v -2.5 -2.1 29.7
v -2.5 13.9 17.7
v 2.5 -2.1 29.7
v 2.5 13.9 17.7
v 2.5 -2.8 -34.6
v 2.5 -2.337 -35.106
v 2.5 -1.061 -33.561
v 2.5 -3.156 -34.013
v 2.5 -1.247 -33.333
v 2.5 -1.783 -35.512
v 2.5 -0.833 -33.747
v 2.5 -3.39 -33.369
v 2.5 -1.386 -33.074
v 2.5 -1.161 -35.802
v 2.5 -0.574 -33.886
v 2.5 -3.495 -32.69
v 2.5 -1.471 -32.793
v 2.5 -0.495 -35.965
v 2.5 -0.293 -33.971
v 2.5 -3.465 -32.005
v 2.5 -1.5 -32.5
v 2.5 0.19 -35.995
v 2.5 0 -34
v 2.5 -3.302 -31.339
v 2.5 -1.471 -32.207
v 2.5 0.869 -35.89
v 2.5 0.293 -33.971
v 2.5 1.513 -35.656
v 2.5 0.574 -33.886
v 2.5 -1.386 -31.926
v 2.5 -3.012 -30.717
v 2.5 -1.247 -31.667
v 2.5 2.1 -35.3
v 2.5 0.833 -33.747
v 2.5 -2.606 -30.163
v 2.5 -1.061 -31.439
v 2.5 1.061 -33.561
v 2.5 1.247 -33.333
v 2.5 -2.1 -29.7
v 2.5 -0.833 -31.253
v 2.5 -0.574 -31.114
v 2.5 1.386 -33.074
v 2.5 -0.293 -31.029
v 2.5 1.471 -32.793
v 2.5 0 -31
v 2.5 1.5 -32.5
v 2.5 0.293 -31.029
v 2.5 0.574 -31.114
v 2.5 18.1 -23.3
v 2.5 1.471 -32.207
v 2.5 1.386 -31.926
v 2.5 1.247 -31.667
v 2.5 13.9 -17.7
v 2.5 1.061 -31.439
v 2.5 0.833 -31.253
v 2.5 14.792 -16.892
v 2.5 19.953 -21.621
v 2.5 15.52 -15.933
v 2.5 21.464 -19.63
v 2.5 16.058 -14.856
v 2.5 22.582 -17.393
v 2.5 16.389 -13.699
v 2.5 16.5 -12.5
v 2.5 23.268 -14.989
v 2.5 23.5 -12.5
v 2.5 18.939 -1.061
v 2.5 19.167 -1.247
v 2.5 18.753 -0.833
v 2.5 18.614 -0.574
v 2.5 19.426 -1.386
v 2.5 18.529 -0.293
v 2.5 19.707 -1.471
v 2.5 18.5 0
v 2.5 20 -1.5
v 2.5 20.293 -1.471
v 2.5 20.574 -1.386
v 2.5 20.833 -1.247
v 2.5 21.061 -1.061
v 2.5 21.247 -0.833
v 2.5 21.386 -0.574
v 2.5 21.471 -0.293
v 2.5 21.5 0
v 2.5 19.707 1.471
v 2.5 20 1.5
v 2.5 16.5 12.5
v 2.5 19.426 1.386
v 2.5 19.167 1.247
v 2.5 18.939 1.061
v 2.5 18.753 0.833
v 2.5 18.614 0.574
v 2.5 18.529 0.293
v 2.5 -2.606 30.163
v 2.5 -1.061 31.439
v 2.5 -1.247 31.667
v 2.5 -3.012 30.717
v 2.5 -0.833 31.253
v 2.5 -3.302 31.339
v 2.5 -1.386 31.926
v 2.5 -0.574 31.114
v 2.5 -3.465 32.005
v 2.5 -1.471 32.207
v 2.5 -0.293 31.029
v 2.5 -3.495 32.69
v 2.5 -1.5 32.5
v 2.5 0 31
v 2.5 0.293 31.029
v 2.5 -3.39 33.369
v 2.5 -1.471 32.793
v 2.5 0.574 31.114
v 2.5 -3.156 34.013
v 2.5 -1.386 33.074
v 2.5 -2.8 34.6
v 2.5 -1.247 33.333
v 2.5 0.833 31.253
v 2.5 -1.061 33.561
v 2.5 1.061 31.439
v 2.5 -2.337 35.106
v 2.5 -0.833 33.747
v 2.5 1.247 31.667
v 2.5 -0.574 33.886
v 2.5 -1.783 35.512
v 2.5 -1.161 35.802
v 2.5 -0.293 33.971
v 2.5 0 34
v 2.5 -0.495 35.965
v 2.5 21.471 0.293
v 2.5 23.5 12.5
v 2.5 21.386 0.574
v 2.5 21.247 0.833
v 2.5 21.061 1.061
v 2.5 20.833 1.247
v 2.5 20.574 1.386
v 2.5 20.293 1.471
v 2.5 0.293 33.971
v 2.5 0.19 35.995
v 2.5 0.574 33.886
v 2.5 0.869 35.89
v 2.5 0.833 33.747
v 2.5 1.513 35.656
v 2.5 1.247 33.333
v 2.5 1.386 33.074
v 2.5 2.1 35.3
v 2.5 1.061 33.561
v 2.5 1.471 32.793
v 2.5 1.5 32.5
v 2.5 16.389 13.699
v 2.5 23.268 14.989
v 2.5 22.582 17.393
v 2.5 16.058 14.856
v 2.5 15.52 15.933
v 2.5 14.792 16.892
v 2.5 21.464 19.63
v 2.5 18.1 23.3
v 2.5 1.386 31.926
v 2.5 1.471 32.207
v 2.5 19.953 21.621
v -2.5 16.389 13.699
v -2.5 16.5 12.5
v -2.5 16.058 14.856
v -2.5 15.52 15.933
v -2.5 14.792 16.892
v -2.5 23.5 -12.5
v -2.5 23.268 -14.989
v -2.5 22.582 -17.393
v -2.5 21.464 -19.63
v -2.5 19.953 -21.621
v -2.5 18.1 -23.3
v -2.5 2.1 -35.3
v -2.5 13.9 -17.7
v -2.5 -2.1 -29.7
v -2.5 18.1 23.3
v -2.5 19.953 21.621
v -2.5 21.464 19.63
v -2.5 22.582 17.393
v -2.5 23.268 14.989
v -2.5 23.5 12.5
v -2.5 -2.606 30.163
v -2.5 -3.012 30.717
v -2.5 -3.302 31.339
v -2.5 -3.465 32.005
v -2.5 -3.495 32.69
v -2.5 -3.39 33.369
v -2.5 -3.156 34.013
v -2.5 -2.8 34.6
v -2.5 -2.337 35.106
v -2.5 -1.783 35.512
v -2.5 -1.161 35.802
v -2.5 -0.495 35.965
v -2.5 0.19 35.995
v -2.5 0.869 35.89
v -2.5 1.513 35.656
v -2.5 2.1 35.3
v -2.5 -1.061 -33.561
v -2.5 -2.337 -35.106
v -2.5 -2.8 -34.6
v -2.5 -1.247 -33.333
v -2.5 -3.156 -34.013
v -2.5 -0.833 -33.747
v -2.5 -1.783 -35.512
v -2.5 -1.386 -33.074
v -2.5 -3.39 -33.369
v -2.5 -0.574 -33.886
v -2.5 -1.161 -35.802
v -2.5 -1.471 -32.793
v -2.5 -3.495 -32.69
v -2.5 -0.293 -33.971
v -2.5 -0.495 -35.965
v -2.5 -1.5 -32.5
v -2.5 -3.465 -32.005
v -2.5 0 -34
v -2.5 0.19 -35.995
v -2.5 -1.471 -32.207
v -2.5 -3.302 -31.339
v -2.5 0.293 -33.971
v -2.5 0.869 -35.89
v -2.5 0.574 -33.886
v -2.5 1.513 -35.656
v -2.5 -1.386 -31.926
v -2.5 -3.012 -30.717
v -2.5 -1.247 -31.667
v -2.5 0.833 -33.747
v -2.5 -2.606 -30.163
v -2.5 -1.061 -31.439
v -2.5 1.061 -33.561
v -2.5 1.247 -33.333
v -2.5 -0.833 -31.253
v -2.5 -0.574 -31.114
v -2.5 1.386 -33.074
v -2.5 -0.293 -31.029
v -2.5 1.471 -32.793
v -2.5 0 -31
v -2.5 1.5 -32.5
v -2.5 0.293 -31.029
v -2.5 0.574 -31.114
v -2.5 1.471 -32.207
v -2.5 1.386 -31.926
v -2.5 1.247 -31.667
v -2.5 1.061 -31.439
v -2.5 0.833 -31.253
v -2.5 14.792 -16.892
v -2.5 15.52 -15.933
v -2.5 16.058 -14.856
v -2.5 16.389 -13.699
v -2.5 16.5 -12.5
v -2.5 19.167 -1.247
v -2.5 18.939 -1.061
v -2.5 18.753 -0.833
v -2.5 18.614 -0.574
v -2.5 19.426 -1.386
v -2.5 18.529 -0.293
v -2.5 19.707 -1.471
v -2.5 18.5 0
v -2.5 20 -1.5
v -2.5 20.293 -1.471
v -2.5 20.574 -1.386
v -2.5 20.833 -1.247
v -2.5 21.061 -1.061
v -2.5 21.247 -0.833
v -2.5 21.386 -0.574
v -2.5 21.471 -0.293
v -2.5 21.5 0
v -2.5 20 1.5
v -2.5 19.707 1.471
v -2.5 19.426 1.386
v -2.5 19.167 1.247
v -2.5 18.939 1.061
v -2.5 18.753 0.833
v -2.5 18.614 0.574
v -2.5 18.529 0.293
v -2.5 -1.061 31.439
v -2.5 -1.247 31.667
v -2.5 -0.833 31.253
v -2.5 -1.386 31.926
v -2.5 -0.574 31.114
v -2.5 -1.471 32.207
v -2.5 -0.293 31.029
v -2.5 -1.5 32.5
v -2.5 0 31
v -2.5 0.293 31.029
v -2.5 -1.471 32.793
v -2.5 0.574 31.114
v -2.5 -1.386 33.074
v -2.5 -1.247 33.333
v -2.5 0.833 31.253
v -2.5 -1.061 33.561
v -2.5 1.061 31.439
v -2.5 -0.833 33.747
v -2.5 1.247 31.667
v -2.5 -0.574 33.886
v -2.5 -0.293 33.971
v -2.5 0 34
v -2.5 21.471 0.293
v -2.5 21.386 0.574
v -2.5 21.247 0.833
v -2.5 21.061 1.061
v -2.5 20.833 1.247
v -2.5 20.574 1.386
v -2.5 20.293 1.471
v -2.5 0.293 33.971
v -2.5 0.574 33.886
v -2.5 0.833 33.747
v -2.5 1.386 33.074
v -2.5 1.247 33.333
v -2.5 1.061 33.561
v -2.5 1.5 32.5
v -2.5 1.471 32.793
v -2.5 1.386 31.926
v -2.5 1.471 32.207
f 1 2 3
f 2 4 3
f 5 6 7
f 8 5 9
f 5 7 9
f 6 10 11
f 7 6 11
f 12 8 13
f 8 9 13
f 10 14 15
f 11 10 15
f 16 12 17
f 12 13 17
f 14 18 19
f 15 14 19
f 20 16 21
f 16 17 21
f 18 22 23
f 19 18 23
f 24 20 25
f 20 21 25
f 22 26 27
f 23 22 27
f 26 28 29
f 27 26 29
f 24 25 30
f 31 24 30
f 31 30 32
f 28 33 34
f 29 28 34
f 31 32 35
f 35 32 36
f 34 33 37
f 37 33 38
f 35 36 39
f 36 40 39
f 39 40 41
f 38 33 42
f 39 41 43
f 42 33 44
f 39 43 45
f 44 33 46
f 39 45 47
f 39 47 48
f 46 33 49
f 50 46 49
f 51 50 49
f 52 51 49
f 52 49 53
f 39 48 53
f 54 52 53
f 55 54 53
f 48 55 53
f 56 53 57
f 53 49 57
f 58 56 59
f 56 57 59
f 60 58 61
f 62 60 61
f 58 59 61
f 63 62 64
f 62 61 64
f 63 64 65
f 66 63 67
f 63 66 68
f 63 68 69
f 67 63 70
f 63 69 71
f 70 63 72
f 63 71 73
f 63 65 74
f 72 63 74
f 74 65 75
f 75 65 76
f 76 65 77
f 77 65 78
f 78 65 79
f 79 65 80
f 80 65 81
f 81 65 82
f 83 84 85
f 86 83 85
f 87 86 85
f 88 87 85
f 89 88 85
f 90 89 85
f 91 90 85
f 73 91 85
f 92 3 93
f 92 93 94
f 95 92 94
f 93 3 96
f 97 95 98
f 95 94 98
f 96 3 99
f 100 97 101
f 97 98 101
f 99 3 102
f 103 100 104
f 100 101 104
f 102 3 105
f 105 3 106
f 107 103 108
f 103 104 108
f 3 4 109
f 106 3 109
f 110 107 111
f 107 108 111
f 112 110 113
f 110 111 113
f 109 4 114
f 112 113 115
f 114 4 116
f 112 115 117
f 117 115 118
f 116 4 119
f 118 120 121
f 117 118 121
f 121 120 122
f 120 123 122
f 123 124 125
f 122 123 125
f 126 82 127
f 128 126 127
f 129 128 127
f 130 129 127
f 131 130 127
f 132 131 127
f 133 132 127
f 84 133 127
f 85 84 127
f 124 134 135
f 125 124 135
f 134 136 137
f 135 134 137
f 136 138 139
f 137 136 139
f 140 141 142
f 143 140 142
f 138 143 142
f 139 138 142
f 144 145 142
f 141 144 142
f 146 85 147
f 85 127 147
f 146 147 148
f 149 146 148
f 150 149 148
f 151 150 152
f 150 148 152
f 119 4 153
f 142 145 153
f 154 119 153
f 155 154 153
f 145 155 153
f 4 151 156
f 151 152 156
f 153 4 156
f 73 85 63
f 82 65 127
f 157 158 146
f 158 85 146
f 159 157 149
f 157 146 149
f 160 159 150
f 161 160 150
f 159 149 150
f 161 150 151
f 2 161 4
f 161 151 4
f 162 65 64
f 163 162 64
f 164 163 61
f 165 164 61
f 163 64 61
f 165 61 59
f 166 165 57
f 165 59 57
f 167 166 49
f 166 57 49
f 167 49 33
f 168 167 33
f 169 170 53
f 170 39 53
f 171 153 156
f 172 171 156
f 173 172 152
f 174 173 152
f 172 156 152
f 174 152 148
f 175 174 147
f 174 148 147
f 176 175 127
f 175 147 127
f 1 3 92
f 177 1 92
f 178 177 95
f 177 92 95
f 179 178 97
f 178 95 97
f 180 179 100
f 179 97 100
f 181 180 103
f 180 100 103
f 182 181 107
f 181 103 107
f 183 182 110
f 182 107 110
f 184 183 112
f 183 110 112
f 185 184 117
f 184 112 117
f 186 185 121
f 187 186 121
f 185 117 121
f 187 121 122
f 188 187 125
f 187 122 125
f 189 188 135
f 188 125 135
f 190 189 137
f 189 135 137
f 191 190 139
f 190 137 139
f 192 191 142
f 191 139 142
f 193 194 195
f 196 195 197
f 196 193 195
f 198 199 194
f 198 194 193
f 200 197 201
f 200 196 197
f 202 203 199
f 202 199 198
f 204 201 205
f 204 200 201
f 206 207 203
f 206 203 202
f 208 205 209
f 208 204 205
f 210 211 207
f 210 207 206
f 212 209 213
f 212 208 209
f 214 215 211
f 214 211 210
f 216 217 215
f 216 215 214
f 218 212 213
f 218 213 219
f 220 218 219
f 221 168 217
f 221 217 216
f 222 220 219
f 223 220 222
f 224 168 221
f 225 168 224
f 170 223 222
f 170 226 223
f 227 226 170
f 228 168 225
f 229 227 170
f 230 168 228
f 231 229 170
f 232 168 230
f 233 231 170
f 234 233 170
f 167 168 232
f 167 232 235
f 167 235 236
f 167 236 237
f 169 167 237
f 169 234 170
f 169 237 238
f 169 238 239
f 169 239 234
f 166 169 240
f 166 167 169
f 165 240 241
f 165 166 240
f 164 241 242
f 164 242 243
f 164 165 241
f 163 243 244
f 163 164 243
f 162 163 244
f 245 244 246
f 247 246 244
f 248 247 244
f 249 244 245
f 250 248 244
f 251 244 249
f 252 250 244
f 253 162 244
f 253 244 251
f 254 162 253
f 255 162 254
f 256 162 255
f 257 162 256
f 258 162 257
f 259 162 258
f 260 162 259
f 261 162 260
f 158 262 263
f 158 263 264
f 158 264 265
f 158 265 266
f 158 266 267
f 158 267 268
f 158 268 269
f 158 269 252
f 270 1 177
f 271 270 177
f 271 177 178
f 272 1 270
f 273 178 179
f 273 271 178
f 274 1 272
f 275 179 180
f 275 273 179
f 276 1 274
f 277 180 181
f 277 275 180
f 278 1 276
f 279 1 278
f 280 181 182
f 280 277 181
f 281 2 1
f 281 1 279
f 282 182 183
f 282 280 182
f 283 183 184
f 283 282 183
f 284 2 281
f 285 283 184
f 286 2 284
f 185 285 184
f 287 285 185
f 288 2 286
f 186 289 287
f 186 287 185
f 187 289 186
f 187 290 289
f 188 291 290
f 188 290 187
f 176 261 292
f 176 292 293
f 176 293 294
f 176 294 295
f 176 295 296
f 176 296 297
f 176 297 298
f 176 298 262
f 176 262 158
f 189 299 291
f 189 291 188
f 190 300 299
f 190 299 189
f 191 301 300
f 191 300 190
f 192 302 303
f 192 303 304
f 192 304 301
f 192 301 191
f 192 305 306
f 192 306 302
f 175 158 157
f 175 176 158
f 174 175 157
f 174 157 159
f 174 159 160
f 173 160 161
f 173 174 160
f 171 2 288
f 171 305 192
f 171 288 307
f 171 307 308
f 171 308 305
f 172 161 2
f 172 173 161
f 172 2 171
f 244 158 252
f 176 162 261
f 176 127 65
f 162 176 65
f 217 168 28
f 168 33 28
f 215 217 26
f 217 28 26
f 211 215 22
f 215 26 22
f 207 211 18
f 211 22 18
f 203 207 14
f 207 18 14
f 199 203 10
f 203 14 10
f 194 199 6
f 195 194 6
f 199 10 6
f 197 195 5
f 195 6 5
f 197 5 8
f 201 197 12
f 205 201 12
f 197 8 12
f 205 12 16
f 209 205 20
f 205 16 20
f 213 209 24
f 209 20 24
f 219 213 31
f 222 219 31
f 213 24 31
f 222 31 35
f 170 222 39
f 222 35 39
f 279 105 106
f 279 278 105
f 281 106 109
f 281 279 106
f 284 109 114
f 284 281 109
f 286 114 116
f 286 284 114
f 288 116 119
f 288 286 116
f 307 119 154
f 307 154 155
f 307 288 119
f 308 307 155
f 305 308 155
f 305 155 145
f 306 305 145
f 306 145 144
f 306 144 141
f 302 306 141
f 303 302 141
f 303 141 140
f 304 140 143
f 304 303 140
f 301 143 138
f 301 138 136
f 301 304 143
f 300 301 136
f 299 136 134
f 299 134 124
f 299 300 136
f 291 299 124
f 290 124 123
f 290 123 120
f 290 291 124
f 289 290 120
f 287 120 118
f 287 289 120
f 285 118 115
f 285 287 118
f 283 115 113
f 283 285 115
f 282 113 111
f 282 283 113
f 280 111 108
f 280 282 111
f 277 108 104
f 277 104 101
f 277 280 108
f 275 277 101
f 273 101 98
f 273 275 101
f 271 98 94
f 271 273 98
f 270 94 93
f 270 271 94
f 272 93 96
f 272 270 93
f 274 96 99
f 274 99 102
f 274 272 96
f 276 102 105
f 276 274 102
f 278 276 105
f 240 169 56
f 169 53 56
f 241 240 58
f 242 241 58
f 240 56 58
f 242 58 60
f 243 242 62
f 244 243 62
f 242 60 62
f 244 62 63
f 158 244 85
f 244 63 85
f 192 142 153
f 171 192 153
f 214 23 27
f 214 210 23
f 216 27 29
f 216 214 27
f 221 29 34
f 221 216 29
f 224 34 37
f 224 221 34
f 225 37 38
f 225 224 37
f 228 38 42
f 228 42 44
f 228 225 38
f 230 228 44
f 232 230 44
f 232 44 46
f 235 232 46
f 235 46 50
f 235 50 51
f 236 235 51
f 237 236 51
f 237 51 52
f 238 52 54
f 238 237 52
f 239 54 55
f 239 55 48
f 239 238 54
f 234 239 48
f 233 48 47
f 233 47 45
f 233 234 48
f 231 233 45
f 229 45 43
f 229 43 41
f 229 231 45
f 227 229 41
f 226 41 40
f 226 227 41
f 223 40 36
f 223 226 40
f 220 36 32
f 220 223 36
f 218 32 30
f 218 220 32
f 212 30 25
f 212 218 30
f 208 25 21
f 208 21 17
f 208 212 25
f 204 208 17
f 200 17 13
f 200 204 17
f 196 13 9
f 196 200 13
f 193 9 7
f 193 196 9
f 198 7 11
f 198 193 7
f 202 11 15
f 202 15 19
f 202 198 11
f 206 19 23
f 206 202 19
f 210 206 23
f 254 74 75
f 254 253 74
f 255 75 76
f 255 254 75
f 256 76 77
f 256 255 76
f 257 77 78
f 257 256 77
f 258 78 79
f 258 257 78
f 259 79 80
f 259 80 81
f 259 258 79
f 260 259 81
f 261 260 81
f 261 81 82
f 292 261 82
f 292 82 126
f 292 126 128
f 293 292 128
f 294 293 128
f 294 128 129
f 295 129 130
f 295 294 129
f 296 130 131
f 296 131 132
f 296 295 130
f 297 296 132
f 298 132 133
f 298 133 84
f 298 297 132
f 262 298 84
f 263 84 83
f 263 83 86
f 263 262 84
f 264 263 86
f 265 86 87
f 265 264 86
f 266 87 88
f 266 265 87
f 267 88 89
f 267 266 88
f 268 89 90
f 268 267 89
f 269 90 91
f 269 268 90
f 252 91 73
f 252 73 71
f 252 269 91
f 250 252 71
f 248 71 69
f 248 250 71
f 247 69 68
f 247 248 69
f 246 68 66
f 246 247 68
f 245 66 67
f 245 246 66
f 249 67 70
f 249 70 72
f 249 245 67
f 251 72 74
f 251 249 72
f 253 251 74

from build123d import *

# Parameters (mm, degrees)
SKETCH1_R           = 1.5
BOSS_EXTRUDE1_DEPTH = 2.5


with BuildPart() as part:
    # Sketch1 → Boss-Extrude1 (new body, symmetric)
    with BuildSketch(Plane(origin=(0, 0, 0), x_dir=(0, 0, -1), z_dir=(1, 0, 0))):
        with BuildLine():
            Line((23.3, 18.1), (35.3, 2.1))
            ThreePointArc((35.3, 2.1), (34.6, -2.8), (29.7, -2.1))
            Line((29.7, -2.1), (17.7, 13.9))
            ThreePointArc((17.7, 13.9), (15.406888371, 15.813776741), (12.5, 16.5))
            Line((12.5, 16.5), (-12.5, 16.5))
            ThreePointArc((-12.5, 16.5), (-15.406888371, 15.813776741), (-17.7, 13.9))
            Line((-17.7, 13.9), (-29.7, -2.1))
            ThreePointArc((-29.7, -2.1), (-34.6, -2.8), (-35.3, 2.1))
            Line((-35.3, 2.1), (-23.3, 18.1))
            ThreePointArc((-23.3, 18.1), (-18.537383539, 22.074767078), (-12.5, 23.5))
            Line((-12.5, 23.5), (12.5, 23.5))
            ThreePointArc((12.5, 23.5), (18.537383539, 22.074767078), (23.3, 18.1))
        make_face()
        with Locations((-32.5, 0)):
            Circle(SKETCH1_R, mode=Mode.SUBTRACT)
        with Locations((32.5, 0)):
            Circle(SKETCH1_R, mode=Mode.SUBTRACT)
        with Locations((0, 20)):
            Circle(SKETCH1_R, mode=Mode.SUBTRACT)
    extrude(amount=BOSS_EXTRUDE1_DEPTH, both=True)


solid = part.part
